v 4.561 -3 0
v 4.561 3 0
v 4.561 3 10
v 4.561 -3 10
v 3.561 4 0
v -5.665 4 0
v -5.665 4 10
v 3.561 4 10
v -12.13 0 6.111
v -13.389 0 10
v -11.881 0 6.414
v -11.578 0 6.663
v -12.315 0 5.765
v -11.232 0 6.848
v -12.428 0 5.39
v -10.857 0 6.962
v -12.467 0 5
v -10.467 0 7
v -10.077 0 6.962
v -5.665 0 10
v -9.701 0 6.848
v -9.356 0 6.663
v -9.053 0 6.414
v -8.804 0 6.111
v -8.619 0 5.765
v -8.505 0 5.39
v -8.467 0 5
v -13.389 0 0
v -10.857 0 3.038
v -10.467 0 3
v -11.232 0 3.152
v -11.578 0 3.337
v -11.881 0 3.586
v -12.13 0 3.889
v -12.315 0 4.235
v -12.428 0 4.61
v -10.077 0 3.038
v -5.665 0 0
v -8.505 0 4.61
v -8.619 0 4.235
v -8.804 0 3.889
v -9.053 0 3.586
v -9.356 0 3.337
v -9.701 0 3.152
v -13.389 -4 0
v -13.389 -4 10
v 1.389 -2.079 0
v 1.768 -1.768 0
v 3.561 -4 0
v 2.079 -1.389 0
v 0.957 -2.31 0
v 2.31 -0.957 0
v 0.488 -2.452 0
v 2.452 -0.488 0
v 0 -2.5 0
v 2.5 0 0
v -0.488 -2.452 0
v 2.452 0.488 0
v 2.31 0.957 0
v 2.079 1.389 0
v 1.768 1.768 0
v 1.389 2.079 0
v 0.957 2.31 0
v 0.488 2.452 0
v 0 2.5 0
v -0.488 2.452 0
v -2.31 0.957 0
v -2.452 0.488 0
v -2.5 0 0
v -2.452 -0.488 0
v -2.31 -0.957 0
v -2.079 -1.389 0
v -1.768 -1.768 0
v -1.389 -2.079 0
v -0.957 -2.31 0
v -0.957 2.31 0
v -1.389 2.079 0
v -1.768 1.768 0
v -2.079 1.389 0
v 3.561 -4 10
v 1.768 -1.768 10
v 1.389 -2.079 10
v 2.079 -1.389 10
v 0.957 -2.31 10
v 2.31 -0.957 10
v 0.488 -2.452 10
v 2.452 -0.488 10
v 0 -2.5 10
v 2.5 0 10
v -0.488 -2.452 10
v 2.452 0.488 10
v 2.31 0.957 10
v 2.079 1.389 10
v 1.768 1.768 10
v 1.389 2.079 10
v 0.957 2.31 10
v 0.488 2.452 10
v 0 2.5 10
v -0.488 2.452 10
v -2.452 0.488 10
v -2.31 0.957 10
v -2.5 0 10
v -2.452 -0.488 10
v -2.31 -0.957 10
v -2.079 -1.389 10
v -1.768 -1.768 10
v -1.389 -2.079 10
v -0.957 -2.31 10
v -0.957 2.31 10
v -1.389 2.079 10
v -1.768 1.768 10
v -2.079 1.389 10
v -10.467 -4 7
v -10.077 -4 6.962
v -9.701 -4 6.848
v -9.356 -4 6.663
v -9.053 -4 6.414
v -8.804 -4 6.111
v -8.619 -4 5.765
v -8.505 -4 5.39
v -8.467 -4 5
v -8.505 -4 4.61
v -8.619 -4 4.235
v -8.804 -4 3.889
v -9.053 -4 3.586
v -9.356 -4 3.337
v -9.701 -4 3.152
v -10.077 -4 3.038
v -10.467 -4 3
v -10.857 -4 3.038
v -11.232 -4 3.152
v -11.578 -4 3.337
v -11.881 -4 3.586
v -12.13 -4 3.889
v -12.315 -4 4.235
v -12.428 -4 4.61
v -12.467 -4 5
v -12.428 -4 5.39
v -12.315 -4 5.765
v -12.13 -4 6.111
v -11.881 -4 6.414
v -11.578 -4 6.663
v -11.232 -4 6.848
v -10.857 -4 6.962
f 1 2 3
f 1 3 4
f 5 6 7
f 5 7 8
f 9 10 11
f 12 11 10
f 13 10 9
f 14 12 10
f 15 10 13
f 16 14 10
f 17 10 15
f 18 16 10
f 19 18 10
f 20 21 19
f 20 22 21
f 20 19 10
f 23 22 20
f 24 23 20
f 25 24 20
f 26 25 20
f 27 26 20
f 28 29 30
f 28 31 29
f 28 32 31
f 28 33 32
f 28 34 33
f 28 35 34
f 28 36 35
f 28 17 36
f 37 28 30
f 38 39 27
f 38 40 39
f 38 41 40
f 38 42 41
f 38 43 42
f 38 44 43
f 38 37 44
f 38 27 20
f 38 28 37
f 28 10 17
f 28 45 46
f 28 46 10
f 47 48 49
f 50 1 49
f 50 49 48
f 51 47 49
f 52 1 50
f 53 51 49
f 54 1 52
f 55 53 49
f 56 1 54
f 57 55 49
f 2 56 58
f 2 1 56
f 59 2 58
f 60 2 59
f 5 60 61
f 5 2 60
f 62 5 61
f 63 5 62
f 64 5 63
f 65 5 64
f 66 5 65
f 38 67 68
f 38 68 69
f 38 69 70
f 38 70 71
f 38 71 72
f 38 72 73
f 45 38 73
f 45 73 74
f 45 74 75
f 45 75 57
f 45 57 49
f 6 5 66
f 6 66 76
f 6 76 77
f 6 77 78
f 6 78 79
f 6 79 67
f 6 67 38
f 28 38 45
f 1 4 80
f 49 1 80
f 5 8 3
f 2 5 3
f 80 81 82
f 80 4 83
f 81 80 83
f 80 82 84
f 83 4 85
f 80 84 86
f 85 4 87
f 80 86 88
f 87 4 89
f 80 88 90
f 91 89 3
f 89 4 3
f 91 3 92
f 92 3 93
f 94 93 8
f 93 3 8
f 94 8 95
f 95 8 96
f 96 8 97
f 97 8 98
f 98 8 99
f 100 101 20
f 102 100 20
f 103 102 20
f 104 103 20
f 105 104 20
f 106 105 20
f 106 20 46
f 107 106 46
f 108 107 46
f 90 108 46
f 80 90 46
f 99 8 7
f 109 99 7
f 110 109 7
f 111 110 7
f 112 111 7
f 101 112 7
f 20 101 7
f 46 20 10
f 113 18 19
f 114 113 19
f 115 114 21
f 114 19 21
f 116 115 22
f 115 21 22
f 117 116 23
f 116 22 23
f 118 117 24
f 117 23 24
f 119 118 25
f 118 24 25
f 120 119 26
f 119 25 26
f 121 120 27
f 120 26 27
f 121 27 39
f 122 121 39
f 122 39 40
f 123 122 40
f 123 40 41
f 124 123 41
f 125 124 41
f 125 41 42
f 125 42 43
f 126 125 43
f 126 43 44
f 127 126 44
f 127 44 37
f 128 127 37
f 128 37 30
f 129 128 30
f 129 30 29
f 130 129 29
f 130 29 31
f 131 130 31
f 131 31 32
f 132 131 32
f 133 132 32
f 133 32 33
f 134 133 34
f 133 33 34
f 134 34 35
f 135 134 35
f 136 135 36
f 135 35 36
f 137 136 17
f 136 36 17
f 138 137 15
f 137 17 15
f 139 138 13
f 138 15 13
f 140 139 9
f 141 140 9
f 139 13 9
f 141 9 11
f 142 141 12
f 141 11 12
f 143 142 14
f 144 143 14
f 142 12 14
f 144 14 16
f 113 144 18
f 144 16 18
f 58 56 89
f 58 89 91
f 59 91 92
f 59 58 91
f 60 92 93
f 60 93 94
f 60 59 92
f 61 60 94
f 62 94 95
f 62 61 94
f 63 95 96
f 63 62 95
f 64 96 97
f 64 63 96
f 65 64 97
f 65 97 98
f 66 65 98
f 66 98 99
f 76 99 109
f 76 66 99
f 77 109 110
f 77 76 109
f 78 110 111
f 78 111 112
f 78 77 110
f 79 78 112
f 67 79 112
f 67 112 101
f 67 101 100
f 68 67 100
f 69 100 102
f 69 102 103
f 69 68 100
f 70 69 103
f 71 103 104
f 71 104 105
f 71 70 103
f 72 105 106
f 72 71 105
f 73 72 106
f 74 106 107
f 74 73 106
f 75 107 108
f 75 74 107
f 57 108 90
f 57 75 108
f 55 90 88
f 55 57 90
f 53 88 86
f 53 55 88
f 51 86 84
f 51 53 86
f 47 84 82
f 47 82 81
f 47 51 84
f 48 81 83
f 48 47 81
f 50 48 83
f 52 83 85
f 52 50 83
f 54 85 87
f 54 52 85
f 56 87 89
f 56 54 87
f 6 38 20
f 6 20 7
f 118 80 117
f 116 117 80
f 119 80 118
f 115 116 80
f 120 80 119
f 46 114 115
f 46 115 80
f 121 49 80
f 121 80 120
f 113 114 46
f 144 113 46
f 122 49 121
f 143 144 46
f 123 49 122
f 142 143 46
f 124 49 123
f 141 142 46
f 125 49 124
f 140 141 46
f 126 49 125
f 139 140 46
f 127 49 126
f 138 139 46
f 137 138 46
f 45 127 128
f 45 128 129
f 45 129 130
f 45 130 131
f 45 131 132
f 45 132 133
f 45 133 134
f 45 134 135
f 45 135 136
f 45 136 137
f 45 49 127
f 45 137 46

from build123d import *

# Parameters (mm, degrees)
SKETCH_1_R          = 2.5
EXTRUDE_1_DEPTH     = 10
SKETCH_2_R          = 2
CUT_EXTRUDE_2_DEPTH = 18.18324903


with BuildPart() as part:
    # Эскиз1 → Вытянуть1 (new body)
    with BuildSketch(Plane.XY):
        Polygon((3.560836522, 4), (4.560836522, 3), (4.560836522, -3), (3.560836522, -4), (-13.388952432, -4), (-13.388952432, 0), (-5.665361164, 0), (-5.665361164, 4), align=None)
        Circle(SKETCH_1_R, mode=Mode.SUBTRACT)
    extrude(amount=EXTRUDE_1_DEPTH)

    # Эскиз2 → Вытянуть2 (cut, through all)
    with BuildSketch(Plane(origin=(0, 0, 0), x_dir=(-1, 0, 0), z_dir=(0, 1, 0))):
        with Locations(Location((10.466786093, 5, 0), (0, 0, 90))):
            Circle(SKETCH_2_R)
    extrude(amount=-CUT_EXTRUDE_2_DEPTH, mode=Mode.SUBTRACT)


solid = part.part
